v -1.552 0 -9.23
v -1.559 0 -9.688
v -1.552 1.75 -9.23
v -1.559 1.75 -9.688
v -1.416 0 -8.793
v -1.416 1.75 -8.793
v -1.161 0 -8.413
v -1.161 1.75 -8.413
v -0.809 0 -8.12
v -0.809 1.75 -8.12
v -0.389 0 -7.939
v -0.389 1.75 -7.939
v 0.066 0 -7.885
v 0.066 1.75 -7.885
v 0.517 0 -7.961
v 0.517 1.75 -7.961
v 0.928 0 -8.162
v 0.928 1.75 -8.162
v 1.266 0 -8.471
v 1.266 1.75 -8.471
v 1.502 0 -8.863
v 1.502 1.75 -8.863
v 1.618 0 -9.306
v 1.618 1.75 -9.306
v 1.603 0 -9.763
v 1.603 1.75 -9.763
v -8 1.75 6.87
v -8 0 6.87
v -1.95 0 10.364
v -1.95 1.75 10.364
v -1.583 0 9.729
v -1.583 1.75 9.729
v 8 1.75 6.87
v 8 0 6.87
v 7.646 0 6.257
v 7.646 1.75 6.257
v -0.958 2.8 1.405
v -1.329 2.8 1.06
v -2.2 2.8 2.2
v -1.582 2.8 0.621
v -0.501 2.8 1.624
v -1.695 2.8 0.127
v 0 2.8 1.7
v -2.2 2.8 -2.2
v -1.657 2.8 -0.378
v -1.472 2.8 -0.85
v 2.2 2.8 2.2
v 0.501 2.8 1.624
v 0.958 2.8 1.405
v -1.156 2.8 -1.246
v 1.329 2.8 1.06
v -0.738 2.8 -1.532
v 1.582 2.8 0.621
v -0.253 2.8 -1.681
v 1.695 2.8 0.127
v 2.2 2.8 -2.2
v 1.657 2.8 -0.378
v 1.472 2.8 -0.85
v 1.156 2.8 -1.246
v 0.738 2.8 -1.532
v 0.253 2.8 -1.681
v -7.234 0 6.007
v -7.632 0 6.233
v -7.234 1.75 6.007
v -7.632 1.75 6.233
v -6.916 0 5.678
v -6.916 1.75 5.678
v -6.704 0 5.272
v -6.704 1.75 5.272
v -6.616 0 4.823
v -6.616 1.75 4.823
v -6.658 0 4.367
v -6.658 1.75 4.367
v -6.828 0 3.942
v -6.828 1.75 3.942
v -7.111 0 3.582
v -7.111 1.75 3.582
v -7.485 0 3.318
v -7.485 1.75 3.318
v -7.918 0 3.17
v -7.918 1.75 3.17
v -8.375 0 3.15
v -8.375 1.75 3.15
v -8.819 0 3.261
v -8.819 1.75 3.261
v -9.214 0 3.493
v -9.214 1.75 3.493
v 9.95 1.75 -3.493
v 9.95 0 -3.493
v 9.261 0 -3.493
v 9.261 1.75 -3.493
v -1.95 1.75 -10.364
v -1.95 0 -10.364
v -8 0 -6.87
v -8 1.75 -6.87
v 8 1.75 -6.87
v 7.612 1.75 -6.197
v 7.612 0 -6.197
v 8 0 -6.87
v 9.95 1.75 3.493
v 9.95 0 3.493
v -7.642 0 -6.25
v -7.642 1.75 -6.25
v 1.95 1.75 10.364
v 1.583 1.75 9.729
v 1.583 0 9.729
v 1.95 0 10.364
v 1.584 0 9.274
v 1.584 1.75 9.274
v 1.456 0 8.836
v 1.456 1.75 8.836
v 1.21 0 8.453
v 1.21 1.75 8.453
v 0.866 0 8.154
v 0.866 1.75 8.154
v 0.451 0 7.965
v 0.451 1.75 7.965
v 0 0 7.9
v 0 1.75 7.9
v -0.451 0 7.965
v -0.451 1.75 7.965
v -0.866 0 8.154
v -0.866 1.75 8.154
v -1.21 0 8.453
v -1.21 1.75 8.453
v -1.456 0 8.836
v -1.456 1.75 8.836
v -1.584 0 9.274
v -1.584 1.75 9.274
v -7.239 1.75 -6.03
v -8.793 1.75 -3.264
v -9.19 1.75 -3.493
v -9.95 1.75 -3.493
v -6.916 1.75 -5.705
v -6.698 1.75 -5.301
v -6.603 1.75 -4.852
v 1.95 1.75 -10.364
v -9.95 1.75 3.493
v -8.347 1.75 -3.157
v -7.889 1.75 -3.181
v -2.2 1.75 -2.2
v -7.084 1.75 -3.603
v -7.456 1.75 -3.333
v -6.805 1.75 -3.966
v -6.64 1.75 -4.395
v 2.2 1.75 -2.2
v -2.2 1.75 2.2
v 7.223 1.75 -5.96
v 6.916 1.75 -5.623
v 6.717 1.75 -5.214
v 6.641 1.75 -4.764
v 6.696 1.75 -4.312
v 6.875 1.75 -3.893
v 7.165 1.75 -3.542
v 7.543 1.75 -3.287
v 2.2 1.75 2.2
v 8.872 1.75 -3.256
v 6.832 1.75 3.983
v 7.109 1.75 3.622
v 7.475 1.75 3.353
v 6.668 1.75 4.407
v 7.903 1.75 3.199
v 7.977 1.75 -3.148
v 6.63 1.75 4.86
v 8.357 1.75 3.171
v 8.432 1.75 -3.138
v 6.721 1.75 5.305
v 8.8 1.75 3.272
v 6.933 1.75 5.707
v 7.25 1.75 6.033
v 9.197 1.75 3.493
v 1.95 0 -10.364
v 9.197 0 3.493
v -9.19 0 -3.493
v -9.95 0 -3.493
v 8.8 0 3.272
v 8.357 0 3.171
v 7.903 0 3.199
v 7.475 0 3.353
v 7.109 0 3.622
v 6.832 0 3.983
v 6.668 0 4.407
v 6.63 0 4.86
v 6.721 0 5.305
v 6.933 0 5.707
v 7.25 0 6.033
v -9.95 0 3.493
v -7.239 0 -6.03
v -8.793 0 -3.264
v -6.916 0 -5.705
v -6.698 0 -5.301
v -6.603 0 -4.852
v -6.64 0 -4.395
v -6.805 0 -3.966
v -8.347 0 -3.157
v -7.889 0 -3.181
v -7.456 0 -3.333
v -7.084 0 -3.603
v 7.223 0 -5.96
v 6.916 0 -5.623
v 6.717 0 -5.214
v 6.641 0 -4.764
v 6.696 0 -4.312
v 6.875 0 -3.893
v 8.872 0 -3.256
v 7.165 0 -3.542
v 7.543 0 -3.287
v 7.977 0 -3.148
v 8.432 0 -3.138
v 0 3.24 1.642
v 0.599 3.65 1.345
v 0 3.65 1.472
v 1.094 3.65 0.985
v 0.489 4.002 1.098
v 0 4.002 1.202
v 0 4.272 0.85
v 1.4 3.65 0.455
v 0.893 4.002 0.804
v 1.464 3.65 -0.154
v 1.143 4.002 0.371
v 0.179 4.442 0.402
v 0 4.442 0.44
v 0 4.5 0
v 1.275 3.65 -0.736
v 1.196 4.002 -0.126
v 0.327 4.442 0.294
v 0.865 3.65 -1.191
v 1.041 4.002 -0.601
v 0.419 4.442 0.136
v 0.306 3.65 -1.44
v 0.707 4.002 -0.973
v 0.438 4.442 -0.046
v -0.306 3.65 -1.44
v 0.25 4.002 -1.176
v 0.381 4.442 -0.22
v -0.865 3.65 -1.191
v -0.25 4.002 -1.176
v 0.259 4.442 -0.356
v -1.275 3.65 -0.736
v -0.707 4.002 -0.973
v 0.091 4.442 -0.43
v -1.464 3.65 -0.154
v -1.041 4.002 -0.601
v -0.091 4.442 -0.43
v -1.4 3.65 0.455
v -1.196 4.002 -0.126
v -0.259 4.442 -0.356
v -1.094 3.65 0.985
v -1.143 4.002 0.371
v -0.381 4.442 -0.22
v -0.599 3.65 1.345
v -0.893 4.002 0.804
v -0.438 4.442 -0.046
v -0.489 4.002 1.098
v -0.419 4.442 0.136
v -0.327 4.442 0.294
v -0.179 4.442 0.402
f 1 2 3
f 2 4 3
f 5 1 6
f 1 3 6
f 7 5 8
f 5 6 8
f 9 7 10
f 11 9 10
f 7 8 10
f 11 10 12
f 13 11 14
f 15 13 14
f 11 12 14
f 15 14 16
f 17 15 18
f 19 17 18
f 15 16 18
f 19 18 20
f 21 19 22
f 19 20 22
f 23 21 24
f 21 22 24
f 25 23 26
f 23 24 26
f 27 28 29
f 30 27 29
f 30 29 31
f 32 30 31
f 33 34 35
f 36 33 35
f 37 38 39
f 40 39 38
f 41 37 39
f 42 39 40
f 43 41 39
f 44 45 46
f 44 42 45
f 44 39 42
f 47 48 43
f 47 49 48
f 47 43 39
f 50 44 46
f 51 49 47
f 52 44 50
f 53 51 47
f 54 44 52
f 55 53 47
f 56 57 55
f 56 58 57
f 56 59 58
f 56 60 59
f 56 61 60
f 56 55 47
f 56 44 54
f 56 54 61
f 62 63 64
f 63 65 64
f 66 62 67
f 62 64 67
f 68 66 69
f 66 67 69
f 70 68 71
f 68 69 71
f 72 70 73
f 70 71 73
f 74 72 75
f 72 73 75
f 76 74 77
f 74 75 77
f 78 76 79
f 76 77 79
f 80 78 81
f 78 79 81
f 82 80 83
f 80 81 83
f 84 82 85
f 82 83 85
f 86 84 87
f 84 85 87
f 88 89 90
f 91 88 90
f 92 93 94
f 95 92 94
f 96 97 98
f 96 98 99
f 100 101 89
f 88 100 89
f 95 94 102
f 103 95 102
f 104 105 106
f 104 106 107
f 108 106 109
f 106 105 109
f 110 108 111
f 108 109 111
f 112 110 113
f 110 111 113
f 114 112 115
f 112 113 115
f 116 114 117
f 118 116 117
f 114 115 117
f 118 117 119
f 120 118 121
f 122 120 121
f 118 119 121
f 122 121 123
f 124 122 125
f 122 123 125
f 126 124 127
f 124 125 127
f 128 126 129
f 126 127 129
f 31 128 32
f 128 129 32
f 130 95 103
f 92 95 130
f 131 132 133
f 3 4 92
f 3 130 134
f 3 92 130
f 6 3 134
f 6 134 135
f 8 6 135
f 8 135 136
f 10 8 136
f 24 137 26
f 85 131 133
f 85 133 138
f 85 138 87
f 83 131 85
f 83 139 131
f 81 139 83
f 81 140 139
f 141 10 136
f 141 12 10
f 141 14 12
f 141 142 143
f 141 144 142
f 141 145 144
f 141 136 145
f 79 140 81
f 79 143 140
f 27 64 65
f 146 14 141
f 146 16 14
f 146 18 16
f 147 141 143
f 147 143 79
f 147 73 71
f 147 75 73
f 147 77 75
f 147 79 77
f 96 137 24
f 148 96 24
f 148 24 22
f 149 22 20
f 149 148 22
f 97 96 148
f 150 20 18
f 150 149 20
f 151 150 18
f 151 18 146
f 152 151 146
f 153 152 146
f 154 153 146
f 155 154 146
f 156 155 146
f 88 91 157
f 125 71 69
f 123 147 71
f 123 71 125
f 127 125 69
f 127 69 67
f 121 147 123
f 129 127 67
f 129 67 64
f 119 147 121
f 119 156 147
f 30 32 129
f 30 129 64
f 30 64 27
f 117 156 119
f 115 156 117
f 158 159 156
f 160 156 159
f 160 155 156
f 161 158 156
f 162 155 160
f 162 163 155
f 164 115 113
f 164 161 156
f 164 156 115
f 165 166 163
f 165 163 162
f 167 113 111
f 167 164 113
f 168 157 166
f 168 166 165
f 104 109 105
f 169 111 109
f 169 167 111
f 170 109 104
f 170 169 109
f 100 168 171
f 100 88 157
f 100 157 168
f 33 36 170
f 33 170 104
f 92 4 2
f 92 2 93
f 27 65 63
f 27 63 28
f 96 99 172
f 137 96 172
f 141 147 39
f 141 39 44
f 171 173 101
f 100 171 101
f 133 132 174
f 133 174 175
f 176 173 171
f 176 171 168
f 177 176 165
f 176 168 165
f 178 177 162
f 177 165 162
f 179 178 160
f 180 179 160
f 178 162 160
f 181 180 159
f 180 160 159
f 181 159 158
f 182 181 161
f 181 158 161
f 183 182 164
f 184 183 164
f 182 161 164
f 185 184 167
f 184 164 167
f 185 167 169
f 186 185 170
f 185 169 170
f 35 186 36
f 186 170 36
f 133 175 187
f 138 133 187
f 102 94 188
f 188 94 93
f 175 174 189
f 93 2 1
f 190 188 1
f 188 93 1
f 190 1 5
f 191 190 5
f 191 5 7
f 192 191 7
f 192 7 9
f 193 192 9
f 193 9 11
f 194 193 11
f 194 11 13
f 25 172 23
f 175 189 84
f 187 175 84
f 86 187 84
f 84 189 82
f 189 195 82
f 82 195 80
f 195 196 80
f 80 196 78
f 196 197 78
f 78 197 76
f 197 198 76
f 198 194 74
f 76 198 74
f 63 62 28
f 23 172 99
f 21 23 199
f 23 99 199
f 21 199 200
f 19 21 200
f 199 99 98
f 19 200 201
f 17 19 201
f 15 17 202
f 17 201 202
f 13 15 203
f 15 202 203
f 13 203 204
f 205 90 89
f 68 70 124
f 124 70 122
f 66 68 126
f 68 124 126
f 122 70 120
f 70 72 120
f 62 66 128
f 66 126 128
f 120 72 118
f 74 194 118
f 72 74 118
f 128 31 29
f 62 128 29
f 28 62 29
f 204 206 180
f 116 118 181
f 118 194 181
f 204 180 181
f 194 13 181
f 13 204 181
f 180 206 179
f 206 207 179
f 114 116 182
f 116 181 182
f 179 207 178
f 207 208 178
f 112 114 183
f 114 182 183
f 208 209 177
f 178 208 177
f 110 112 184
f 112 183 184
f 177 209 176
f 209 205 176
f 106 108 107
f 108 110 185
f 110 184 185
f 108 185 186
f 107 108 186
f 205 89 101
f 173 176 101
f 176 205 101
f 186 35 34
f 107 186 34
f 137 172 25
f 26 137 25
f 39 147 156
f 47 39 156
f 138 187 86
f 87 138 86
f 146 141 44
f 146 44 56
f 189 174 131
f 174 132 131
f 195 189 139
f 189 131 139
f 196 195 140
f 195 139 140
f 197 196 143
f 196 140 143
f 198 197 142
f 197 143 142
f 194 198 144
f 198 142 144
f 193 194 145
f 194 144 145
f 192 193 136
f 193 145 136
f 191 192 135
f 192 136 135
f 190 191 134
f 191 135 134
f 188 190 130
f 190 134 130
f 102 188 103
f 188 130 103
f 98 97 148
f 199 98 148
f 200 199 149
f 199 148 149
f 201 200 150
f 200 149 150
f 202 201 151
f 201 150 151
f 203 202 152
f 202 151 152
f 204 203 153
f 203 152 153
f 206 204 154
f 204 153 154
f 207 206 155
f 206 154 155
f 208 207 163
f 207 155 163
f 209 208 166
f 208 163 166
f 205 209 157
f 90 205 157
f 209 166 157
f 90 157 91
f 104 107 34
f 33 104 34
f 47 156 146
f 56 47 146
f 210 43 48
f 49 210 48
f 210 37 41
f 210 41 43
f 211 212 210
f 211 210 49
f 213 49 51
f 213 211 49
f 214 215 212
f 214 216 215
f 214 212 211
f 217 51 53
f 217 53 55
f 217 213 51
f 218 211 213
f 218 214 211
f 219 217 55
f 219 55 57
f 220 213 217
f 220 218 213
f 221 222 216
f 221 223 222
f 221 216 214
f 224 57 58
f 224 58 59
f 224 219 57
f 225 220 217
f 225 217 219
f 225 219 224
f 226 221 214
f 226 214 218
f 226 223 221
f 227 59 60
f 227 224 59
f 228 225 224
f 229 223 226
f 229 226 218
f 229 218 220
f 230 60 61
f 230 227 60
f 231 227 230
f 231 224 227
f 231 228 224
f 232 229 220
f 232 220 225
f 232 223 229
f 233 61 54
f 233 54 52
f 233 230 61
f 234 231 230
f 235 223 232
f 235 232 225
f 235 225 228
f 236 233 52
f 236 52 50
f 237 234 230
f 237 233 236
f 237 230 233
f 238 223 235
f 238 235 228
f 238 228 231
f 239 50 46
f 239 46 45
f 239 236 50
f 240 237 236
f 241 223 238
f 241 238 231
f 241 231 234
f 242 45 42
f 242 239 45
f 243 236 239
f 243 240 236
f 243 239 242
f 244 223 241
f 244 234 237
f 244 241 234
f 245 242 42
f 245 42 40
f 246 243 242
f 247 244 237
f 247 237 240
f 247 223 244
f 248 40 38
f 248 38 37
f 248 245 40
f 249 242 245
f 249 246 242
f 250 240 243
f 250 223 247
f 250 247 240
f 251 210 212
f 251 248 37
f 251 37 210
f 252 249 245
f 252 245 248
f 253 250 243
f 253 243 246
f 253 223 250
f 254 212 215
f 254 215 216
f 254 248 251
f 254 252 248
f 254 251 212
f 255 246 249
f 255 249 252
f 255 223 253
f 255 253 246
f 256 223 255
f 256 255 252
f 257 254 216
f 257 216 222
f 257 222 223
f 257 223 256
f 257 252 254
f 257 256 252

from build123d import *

# Parameters (mm, degrees)
SKETCH1_R           = 9.5
BOSS_EXTRUDE1_DEPTH = 1.75
BOSS_EXTRUDE4_START = -1.75
BOSS_EXTRUDE4_DEPTH = 1.75
SKETCH2_R           = 1.6
CUT_EXTRUDE1_DEPTH  = 1.75
SKETCH3_W           = 4.4
SKETCH3_H           = 4.4
BOSS_EXTRUDE2_DEPTH = 1.05
SKETCH4_R           = 1.7
BOSS_EXTRUDE3_DEPTH = 1.7
FILLET1_R           = 1.7


with BuildPart() as part:
    # Sketch1 → Boss-Extrude1 (new body)
    with BuildSketch(Plane(origin=(0, 0, 0), x_dir=(1, 0, 0), z_dir=(0, 1, 0))):
        with Locations(Location((0, 0, 0), (0, 0, 270))):
            Circle(SKETCH1_R)
    extrude(amount=BOSS_EXTRUDE1_DEPTH)

    # Sketch5 → Boss-Extrude4 (add)
    with BuildSketch(Plane(origin=(0, 1.75, 0), x_dir=(1, 0, 0), z_dir=(0, 1, 0)).offset(BOSS_EXTRUDE4_START)):
        with BuildLine():
            Line((-1.949608457, 10.363663389), (-8.000391543, 6.870242146))
            Line((-8.000391543, 6.870242146), (-7.44257413, 5.904074045))
            ThreePointArc((-7.44257413, 5.904074045), (-4.75, 8.227241336), (-1.391791044, 9.397495288))
            Line((-1.391791044, 9.397495288), (-1.949608457, 10.363663389))
        make_face()
        with BuildLine():
            ThreePointArc((-8.834365173, -3.493421243), (-9.5, 0), (-8.834365173, 3.493421243))
            Line((-8.834365173, 3.493421243), (-9.95, 3.493421243))
            Line((-9.95, 3.493421243), (-9.95, -3.493421243))
            Line((-9.95, -3.493421243), (-8.834365173, -3.493421243))
        make_face()
        with BuildLine():
            Line((1.949608457, 10.363663389), (1.391791044, 9.397495288))
            ThreePointArc((1.391791044, 9.397495288), (4.75, 8.227241336), (7.44257413, 5.904074045))
            Line((7.44257413, 5.904074045), (8.000391543, 6.870242146))
            Line((8.000391543, 6.870242146), (1.949608457, 10.363663389))
        make_face()
        with BuildLine():
            ThreePointArc((-1.391791044, -9.397495288), (-4.75, -8.227241336), (-7.44257413, -5.904074045))
            Line((-7.44257413, -5.904074045), (-8.000391543, -6.870242146))
            Line((-8.000391543, -6.870242146), (-1.949608457, -10.363663389))
            Line((-1.949608457, -10.363663389), (-1.391791044, -9.397495288))
        make_face()
        with BuildLine():
            Line((9.95, 3.493421243), (8.834365173, 3.493421243))
            ThreePointArc((8.834365173, 3.493421243), (9.5, 0), (8.834365173, -3.493421243))
            Line((8.834365173, -3.493421243), (9.95, -3.493421243))
            Line((9.95, -3.493421243), (9.95, 3.493421243))
        make_face()
        with BuildLine():
            ThreePointArc((7.44257413, -5.904074045), (4.75, -8.227241336), (1.391791044, -9.397495288))
            Line((1.391791044, -9.397495288), (1.949608457, -10.363663389))
            Line((1.949608457, -10.363663389), (8.000391543, -6.870242146))
            Line((8.000391543, -6.870242146), (7.44257413, -5.904074045))
        make_face()
    extrude(amount=BOSS_EXTRUDE4_DEPTH)

    # Sketch2 → Cut-Extrude1 (cut)
    with BuildSketch(Plane(origin=(0, 1.75, 0), x_dir=(1, 0, 0), z_dir=(0, 1, 0))):
        with Locations((0, -9.5)):
            Circle(SKETCH2_R)
        with Locations((-8.213474399, -4.742078212)):
            Circle(SKETCH2_R)
        with Locations((-8.199730461, 4.749960166)):
            Circle(SKETCH2_R)
        with Locations((0.027487877, 9.484076755)):
            Circle(SKETCH2_R)
        with Locations((8.240962276, 4.726154966)):
            Circle(SKETCH2_R)
        with Locations((8.227218338, -4.765883411)):
            Circle(SKETCH2_R)
    extrude(amount=-CUT_EXTRUDE1_DEPTH, mode=Mode.SUBTRACT)

    # Sketch3 → Boss-Extrude2 (add)
    with BuildSketch(Plane(origin=(0, 1.75, 0), x_dir=(1, 0, 0), z_dir=(0, 1, 0))):
        Rectangle(SKETCH3_W, SKETCH3_H)
    extrude(amount=BOSS_EXTRUDE2_DEPTH)

    # Sketch4 → Boss-Extrude3 (add)
    with BuildSketch(Plane(origin=(0, 2.8, 0), x_dir=(1, 0, 0), z_dir=(0, 1, 0))):
        with Locations(Location((0, 0, 0), (0, 0, 270))):
            Circle(SKETCH4_R)
    extrude(amount=BOSS_EXTRUDE3_DEPTH)

    # Fillet1
    fillet1_edges = [part.edges().sort_by_distance(p)[0] for p in [
        (0, 4.5, -1.7),
    ]]
    fillet(fillet1_edges, radius=FILLET1_R - 0.0001)  # a hair under: the kernel refuses the full size


solid = part.part
